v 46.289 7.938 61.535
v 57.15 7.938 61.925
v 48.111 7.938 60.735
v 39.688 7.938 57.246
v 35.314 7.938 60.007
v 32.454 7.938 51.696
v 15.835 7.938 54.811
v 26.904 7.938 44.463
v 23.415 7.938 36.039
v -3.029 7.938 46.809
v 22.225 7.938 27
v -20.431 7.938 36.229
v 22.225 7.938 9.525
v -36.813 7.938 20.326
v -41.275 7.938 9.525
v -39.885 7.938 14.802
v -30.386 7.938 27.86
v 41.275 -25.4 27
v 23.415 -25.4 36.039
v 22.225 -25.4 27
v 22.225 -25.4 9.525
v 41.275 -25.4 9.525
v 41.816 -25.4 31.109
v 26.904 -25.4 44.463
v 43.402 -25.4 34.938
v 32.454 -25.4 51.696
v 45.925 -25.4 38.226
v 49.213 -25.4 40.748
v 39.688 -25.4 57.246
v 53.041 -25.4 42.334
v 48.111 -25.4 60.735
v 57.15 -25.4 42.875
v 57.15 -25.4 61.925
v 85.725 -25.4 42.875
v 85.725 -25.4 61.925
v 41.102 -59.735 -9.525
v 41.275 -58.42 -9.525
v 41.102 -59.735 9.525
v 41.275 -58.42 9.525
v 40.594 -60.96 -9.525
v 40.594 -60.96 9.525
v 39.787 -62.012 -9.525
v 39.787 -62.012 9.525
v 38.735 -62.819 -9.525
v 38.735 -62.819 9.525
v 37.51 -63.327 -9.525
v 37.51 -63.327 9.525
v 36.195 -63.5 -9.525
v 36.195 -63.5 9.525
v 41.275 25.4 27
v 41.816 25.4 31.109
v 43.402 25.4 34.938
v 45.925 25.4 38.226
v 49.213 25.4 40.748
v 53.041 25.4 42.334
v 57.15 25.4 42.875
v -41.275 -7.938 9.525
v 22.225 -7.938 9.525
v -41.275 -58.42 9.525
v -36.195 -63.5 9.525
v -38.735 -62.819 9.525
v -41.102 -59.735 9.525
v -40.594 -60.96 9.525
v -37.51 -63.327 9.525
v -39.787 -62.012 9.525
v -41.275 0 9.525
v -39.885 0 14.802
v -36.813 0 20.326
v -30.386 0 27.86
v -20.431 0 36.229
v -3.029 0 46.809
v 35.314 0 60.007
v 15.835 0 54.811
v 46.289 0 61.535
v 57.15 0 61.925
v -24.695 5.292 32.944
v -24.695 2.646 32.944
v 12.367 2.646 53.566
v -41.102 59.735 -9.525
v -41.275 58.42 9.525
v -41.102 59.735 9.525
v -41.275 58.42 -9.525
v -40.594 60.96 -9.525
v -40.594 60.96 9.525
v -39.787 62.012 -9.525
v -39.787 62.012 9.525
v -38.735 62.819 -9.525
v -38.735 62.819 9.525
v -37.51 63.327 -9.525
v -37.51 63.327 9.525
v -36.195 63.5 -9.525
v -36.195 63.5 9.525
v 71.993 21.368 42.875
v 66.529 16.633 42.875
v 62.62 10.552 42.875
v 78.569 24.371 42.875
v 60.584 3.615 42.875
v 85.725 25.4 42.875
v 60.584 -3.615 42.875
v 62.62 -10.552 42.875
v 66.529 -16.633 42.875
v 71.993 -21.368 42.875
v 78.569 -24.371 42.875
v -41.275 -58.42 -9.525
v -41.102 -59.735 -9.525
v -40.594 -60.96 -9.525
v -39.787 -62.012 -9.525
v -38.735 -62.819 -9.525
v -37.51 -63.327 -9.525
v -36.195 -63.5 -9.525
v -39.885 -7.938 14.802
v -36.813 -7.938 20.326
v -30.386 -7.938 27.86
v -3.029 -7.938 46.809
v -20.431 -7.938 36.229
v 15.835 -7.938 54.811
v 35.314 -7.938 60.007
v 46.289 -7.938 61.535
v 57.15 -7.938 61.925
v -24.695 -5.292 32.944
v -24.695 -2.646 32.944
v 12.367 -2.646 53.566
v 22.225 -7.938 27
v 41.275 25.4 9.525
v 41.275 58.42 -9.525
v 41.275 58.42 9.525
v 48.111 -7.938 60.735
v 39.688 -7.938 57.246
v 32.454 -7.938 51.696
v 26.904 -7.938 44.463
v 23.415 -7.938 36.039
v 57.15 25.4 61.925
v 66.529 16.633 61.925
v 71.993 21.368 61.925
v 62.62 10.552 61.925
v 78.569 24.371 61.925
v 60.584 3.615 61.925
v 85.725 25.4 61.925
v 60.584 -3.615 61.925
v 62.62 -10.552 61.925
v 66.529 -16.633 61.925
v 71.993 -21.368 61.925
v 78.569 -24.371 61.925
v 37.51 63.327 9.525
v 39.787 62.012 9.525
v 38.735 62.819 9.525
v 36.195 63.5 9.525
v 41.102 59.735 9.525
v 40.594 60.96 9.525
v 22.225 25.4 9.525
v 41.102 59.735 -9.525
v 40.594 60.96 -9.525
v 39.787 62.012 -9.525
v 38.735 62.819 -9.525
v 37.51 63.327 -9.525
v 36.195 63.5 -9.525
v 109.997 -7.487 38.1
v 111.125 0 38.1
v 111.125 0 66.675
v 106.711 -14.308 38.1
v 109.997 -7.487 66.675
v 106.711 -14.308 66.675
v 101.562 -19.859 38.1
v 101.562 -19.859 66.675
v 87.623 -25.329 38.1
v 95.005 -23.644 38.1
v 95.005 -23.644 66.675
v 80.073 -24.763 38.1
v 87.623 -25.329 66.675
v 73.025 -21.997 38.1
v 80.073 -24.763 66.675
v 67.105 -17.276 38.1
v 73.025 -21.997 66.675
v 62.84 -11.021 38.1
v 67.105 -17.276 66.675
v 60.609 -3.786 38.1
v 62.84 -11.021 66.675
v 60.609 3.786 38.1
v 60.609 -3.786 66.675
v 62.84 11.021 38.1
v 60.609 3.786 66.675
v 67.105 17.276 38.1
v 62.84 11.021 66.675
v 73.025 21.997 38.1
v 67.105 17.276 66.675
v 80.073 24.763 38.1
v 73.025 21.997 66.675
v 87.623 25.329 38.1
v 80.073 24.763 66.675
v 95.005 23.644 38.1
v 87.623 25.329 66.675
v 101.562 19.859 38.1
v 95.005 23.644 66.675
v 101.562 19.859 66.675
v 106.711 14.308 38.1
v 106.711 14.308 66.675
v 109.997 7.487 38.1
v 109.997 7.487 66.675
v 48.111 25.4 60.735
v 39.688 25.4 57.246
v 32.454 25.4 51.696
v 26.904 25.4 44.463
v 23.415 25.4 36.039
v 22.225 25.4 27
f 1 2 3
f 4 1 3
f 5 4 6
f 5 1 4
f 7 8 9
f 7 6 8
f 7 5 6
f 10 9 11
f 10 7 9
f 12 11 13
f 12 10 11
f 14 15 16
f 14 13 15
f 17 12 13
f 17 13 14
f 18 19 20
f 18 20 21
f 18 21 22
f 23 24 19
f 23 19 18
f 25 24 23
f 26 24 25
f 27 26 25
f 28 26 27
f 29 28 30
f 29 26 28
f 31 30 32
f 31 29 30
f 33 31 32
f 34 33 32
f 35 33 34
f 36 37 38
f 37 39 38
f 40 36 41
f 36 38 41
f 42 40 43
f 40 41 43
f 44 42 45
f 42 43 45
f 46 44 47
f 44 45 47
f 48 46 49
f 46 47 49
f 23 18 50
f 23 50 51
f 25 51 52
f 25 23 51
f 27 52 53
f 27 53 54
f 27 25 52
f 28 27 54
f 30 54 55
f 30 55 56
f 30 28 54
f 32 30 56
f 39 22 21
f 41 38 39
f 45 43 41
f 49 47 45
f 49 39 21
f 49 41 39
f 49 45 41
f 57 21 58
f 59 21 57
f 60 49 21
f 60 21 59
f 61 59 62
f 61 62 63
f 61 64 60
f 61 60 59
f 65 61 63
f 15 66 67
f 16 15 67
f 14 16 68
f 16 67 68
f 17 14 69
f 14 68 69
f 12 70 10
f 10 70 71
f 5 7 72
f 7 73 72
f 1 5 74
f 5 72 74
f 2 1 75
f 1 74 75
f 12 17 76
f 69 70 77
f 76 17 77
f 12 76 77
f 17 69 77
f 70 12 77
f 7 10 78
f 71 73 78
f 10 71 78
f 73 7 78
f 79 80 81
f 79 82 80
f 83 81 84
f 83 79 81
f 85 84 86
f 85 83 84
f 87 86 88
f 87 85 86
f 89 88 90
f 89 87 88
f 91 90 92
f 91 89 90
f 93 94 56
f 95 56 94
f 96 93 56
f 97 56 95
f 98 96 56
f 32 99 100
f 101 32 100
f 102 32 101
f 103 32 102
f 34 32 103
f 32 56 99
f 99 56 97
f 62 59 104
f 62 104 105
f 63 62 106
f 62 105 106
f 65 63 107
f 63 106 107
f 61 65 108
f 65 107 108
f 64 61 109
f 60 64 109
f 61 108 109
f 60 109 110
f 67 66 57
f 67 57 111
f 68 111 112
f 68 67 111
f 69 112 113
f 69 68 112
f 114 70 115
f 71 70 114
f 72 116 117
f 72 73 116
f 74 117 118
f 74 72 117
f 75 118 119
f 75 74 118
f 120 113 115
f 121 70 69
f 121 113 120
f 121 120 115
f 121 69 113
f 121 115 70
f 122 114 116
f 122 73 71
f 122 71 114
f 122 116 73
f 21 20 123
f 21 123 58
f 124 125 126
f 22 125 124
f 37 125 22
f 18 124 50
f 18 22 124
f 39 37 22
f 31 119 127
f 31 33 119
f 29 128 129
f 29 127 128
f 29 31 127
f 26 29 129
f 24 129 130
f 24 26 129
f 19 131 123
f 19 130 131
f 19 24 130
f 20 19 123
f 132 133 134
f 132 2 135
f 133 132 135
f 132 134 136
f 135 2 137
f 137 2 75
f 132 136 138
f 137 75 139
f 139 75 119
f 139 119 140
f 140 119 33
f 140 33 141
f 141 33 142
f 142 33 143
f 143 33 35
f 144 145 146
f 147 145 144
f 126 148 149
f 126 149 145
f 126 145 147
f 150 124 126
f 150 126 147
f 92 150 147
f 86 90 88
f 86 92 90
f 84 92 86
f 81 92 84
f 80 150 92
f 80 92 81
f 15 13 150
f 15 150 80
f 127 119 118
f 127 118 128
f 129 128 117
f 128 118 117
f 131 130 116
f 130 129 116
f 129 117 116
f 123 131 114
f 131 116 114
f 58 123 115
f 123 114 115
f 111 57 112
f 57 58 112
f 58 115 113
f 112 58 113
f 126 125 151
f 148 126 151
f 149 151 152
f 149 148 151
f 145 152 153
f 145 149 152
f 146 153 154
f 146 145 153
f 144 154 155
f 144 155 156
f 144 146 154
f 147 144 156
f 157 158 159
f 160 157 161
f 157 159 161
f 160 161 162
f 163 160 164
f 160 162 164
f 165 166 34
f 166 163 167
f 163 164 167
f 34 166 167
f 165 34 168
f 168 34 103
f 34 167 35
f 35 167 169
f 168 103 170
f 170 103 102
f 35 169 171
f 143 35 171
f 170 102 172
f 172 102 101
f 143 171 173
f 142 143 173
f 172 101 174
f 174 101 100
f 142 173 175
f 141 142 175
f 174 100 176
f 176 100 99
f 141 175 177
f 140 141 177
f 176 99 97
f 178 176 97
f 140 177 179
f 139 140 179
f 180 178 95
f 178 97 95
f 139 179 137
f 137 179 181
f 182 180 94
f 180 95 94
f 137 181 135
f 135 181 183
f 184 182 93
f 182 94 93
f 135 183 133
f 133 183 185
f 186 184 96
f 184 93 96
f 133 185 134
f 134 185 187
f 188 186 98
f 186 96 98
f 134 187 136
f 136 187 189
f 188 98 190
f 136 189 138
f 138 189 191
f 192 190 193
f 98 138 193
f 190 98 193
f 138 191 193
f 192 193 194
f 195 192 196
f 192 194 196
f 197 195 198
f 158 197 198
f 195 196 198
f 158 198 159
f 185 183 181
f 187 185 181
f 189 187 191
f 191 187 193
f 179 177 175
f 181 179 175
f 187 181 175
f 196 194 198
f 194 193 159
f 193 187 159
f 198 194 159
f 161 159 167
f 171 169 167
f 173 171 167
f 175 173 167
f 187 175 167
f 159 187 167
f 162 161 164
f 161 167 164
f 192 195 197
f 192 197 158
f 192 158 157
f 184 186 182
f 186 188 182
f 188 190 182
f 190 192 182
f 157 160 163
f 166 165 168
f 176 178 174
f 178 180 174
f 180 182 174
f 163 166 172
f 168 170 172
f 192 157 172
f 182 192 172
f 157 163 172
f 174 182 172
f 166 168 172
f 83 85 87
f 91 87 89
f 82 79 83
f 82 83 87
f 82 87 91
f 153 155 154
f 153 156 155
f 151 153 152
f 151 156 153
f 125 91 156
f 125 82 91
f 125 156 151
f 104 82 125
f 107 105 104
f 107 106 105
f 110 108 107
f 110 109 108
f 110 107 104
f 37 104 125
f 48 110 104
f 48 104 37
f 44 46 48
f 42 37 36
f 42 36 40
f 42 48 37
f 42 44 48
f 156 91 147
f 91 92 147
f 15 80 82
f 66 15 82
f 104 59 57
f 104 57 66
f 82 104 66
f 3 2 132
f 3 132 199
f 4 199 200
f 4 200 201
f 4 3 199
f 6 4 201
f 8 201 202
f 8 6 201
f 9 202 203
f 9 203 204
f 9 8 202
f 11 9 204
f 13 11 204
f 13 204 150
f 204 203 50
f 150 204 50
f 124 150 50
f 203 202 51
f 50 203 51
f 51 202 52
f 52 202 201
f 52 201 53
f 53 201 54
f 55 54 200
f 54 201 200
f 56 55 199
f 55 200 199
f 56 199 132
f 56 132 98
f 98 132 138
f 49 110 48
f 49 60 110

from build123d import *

# Parameters (mm, degrees)
F1_DEPTH = 63.5
F2_DEPTH = 25.4
F3_DEPTH = 7.9375
F0_W     = 25.4
F0_H     = 19.05
F4_DEPTH = 25.4
F6_R     = 5.08


# Not quite as in the source:
# - a feature names something its author has since deleted; it is built from what else it names


with BuildPart() as f1:
    # F0 (on Front) → F1 (new body, symmetric)
    with BuildSketch(Plane.XZ):
        Polygon((22.225, 9.525), (-41.275, 9.525), (-41.275, -9.525), (41.275, -9.525), (41.275, 9.525), align=None)
    extrude(amount=F1_DEPTH, both=True)

    # F0 (on Front) → F2 (join, symmetric)
    with BuildSketch(Plane.XZ):
        with BuildLine():
            Line((22.225, 27.0002), (22.225, 9.525))
            Line((22.225, 9.525), (41.275, 9.525))
            Line((41.275, 9.525), (41.275, 27.0002))
            ThreePointArc((41.275, 27.0002), (45.9246798487, 38.2255201513), (57.15, 42.8752))
            Line((57.15, 42.8752), (60.325, 42.8752))
            Line((60.325, 42.8752), (60.325, 61.9252))
            Line((60.325, 61.9252), (57.15, 61.9252))
            ThreePointArc((57.15, 61.9252), (32.4542956671, 51.6959043329), (22.225, 27.0002))
        make_face()
    extrude(amount=F2_DEPTH, both=True)

    # F0 (on Front) → F3 (join, symmetric)
    with BuildSketch(Plane.XZ):
        with BuildLine():
            add(Edge.make_bspline(
                [(-41.275, 9.525), (-39.190236479, 31.1887320131), (12.7593874931, 62.8514587879), (57.15, 61.9252)],
                knots=[0, 0, 0, 0, 111.5045361635, 111.5045361635, 111.5045361635, 111.5045361635], degree=3))
            Line((-41.275, 9.525), (22.225, 9.525))
            Line((22.225, 9.525), (22.225, 27.0002))
            ThreePointArc((22.225, 27.0002), (32.4542956671, 51.6959043329), (57.15, 61.9252))
        make_face()
    extrude(amount=F3_DEPTH, both=True)

    # F0 (on Front) → F4 (join, symmetric)
    with BuildSketch(Plane.XZ):
        with Locations((73.025, 52.4002)):
            Rectangle(F0_W, F0_H)
    extrude(amount=F4_DEPTH, both=True)

    # F0 (on Front) → F5 (revolve)
    with BuildSketch(Plane.XZ):
        Polygon((85.725, 66.675), (85.725, 61.9252), (85.725, 42.8752), (85.725, 38.1), (111.125, 38.1), (111.125, 66.675), align=None)
    revolve(axis=Axis((85.725, 0, 52.3875), (0, 0, -1)))

    # F6
    f6_edges = [f1.edges().sort_by_distance(p)[0] for p in [
        (41.275, -63.5, 0),
        (-41.275, -63.5, 0),
        (-41.275, 63.5, 0),
        (41.275, 63.5, 0),
    ]]
    fillet(f6_edges, radius=F6_R)


solid = f1.part
